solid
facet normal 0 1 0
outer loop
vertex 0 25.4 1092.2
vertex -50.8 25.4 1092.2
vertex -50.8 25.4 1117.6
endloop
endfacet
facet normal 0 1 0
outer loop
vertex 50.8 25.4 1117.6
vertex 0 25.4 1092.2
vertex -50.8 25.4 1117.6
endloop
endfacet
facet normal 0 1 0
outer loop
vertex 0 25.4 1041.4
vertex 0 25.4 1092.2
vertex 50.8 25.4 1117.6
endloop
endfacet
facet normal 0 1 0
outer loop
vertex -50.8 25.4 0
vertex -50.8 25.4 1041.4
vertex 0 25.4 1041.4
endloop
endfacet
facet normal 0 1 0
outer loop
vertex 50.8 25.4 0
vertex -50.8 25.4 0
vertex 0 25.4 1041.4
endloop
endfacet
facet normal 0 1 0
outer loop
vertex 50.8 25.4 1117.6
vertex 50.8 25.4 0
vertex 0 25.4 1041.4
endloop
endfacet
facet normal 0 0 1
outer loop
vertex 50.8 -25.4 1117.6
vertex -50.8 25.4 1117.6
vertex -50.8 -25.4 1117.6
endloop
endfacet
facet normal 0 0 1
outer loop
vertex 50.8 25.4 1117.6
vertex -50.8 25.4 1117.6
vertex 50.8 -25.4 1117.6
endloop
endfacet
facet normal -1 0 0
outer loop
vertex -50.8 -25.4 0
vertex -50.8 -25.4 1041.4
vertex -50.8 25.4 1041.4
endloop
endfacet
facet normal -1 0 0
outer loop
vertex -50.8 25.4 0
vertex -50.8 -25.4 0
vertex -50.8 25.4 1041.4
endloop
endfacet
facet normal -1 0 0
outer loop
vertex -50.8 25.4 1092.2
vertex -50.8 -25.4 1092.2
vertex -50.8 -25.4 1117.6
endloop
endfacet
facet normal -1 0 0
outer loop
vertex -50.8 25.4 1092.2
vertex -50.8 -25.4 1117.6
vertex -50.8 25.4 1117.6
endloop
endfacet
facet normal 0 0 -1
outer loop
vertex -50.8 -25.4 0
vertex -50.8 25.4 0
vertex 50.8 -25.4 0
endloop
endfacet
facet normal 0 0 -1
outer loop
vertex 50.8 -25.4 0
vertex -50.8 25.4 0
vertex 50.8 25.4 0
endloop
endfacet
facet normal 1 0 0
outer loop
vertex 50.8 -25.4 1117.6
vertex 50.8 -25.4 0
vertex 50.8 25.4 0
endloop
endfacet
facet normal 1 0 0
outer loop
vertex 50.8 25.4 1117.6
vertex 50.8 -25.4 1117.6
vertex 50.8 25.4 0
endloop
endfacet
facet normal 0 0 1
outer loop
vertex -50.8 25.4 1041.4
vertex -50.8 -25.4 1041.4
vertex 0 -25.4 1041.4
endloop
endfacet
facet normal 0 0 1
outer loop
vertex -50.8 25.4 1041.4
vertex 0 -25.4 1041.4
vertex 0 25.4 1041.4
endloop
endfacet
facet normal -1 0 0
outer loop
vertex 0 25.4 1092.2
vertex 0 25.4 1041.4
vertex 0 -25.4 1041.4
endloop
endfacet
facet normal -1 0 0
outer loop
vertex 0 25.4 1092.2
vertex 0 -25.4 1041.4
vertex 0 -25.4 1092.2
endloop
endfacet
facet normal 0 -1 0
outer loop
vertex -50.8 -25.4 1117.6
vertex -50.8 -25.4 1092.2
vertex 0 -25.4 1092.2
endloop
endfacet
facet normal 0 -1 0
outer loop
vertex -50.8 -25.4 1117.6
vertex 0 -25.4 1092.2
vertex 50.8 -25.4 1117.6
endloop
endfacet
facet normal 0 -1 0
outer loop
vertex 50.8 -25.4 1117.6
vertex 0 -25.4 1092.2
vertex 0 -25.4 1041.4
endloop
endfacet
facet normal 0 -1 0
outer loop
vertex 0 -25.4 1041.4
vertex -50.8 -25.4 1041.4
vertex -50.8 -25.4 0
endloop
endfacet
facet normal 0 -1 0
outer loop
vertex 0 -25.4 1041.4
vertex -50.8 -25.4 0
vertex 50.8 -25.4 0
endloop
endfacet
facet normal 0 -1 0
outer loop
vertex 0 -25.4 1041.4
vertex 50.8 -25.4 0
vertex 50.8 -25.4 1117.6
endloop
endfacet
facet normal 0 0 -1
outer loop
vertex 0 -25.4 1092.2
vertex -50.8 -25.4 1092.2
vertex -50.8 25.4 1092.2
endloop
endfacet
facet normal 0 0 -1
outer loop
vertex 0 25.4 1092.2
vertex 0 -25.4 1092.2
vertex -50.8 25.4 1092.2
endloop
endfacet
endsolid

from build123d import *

# Parameters (mm, degrees)
SKETCH1_W           = 101.6
SKETCH1_H           = 50.8
BOSS_EXTRUDE1_DEPTH = 1219.2
SKETCH2_W           = 101.6
SKETCH2_H           = 50.8
CUT_EXTRUDE1_DEPTH  = 101.6
SKETCH3_W           = 50.8
SKETCH3_H           = 50.8
CUT_EXTRUDE2_DEPTH  = 50.8


with BuildPart() as part:
    # Sketch1 → Boss-Extrude1 (new body)
    with BuildSketch(Plane.XY):
        Rectangle(SKETCH1_W, SKETCH1_H)
    extrude(amount=BOSS_EXTRUDE1_DEPTH)

    # Sketch2 → Cut-Extrude1 (cut)
    with BuildSketch(Plane.XY.offset(1219.2)):
        Rectangle(SKETCH2_W, SKETCH2_H)
    extrude(amount=-CUT_EXTRUDE1_DEPTH, mode=Mode.SUBTRACT)

    # Sketch3 → Cut-Extrude2 (cut)
    with BuildSketch(Plane.ZY.offset(50.8)):
        with Locations((1066.8, 0)):
            Rectangle(SKETCH3_W, SKETCH3_H)
    extrude(amount=-CUT_EXTRUDE2_DEPTH, mode=Mode.SUBTRACT)


solid = part.part
